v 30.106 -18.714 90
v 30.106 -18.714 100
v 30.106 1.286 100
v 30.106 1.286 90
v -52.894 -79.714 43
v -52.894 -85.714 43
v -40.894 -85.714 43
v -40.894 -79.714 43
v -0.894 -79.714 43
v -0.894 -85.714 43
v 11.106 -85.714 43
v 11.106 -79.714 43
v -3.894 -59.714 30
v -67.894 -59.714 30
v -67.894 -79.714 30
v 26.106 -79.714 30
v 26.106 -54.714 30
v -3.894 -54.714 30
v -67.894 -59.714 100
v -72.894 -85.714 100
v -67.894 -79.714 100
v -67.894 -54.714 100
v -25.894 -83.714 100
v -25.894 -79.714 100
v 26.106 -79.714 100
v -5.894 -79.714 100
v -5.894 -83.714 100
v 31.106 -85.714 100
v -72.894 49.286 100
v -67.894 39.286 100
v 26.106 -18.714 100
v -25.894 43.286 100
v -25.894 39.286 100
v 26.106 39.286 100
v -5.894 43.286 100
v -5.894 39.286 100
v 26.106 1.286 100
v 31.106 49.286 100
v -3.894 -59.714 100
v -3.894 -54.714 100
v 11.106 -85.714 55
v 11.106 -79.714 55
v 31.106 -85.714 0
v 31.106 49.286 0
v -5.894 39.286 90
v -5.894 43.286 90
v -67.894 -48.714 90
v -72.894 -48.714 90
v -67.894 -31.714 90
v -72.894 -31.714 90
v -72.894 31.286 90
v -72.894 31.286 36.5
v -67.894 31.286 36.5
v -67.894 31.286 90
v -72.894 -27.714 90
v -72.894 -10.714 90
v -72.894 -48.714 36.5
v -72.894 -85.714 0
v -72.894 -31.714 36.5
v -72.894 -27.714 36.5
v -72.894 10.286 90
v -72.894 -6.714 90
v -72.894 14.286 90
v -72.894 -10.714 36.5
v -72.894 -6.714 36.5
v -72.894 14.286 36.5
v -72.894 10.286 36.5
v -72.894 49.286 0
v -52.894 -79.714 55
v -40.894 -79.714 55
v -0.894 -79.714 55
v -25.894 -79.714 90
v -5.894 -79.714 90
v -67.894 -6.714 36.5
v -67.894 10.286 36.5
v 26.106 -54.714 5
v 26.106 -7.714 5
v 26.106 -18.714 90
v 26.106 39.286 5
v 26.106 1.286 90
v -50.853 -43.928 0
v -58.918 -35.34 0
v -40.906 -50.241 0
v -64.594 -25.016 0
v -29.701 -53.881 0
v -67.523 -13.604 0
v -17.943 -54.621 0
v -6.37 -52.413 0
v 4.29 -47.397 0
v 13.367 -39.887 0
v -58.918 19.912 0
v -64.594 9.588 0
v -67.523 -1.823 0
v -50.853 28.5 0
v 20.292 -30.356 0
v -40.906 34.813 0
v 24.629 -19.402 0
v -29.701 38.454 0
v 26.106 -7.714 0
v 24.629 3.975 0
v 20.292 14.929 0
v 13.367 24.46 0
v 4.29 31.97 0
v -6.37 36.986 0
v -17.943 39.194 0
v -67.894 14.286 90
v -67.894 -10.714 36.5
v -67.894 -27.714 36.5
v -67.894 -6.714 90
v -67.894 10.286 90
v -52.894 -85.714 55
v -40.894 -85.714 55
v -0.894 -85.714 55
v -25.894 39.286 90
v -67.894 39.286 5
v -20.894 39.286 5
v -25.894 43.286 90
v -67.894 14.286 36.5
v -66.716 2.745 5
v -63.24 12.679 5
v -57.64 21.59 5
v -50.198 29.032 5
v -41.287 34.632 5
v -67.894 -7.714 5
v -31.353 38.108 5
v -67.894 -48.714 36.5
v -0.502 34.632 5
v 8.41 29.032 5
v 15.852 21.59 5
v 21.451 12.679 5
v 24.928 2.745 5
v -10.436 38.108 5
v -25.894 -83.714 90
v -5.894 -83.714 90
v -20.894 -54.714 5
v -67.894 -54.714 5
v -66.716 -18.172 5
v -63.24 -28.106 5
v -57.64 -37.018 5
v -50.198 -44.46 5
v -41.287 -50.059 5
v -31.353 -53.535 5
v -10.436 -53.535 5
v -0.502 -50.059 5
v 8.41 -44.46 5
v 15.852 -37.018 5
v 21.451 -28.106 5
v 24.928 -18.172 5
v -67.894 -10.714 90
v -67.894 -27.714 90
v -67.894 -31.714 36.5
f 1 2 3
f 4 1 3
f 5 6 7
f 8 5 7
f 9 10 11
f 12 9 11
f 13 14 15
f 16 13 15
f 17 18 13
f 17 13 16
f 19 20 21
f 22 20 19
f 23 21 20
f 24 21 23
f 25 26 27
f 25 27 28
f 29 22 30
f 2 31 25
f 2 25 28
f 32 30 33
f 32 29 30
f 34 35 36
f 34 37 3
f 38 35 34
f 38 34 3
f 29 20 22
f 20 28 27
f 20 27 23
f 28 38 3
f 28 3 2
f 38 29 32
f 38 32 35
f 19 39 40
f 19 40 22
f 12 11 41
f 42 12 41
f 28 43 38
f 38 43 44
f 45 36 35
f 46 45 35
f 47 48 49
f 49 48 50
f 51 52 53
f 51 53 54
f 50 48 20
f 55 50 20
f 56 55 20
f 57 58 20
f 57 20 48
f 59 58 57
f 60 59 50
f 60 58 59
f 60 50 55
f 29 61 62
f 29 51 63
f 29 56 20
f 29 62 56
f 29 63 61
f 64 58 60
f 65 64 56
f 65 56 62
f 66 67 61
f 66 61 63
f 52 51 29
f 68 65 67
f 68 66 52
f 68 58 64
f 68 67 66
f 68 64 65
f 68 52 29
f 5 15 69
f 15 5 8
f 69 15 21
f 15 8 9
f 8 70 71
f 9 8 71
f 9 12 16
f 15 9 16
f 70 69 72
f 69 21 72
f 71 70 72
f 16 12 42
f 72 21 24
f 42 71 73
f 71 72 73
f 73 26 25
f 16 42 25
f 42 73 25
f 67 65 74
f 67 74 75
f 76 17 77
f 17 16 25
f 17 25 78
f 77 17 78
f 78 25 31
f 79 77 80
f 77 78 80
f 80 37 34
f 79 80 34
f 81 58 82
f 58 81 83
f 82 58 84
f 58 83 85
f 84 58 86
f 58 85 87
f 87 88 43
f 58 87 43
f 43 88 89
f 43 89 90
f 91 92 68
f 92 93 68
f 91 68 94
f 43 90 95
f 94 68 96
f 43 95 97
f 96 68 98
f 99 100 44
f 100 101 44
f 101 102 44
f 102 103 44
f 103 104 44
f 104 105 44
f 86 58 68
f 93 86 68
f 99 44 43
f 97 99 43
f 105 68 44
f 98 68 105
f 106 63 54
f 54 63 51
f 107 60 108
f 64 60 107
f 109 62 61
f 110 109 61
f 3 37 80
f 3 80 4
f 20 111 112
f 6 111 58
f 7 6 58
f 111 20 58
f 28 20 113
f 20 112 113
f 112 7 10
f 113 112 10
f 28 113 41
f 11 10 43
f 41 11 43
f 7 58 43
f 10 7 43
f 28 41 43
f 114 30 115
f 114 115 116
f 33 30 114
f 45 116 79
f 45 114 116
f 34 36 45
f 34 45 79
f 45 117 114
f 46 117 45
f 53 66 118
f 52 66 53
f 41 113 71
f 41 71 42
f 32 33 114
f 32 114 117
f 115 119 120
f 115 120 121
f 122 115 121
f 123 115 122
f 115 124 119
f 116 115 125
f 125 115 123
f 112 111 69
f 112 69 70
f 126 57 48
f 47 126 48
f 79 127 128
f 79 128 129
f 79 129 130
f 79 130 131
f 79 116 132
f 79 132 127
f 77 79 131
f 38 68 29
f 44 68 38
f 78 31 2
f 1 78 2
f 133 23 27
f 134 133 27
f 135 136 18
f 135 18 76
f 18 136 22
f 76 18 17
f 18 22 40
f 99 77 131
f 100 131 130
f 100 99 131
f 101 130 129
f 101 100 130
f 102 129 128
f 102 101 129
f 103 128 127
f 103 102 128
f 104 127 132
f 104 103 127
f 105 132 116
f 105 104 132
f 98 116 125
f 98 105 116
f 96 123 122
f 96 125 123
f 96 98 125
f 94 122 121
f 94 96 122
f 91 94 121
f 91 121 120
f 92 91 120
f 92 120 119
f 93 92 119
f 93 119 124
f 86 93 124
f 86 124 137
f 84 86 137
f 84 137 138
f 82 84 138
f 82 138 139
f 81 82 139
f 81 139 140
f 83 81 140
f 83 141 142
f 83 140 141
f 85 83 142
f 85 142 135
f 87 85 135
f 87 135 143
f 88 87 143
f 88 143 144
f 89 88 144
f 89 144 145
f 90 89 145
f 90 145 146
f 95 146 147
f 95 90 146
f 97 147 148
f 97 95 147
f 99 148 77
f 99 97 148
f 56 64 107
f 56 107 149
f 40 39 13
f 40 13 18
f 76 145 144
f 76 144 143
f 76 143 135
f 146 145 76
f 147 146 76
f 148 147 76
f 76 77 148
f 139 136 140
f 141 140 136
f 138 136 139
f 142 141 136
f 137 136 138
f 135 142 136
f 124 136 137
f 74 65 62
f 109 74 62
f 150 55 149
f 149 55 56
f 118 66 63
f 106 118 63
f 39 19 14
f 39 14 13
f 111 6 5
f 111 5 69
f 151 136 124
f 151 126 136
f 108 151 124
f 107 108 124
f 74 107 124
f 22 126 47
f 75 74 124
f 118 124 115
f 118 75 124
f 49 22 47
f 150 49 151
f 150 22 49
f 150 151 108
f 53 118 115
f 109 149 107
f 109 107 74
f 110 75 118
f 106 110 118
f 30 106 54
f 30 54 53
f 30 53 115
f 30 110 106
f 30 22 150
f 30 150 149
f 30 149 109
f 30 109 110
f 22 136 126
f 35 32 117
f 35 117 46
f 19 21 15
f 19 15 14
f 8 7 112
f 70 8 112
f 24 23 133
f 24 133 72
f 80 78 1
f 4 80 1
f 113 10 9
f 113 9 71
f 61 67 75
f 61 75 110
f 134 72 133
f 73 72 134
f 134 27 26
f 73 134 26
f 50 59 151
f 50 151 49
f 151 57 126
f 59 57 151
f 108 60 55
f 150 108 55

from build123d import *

# Parameters (mm, degrees)
SKETCH_1_W          = 104
SKETCH_1_H          = 135
SKETCH_1_R          = 47
EXTRUDE_2_DEPTH     = 100
SKETCH_2_W          = 94
SKETCH_2_H          = 94
CUT_EXTRUDE_1_DEPTH = 95
SKETCH_3_W          = 30
SKETCH_3_H          = 5
SKETCH_3_W_2        = 94
SKETCH_3_H_2        = 20
CUT_EXTRUDE_3_DEPTH = 70
SKETCH_4_W          = 20
SKETCH_4_H          = 4
SKETCH_4_W_2        = 4
SKETCH_4_H_2        = 20
CUT_EXTRUDE_4_DEPTH = 10
CUT_EXTRUDE_6_REACH = 106
SKETCH_6_W          = 53.5
SKETCH_6_H          = 17
CUT_EXTRUDE_7_REACH = 137
SKETCH_7_W          = 12
SKETCH_7_H          = 12


with BuildPart() as part:
    # 草圖1 → 填料-伸長2 (new body)
    with BuildSketch(Plane.XY):
        with Locations((-20.894077044, -18.213740458)):
            Rectangle(SKETCH_1_W, SKETCH_1_H)
        with Locations((-20.894077044, -7.713740458)):
            Circle(SKETCH_1_R, mode=Mode.SUBTRACT)
    extrude(amount=EXTRUDE_2_DEPTH)

    # 草圖2 → 除料-伸長1 (cut)
    with BuildSketch(Plane.XY.offset(100)):
        with Locations((-20.894077044, -7.713740458)):
            Rectangle(SKETCH_2_W, SKETCH_2_H)
    extrude(amount=-CUT_EXTRUDE_1_DEPTH, mode=Mode.SUBTRACT)

    # 草圖3 → 除料-伸長3 (cut)
    with BuildSketch(Plane.XY.offset(100)):
        with Locations((11.105922956, -57.213740458)):
            Rectangle(SKETCH_3_W, SKETCH_3_H)
        with Locations((-20.894077044, -69.713740458)):
            Rectangle(SKETCH_3_W_2, SKETCH_3_H_2)
    extrude(amount=-CUT_EXTRUDE_3_DEPTH, mode=Mode.SUBTRACT)

    # 草圖4 → 除料-伸長4 (cut)
    with BuildSketch(Plane.XY.offset(100)):
        with Locations((-15.894077044, -81.713740458)):
            Rectangle(SKETCH_4_W, SKETCH_4_H)
        with Locations((28.105922956, -8.713740458)):
            Rectangle(SKETCH_4_W_2, SKETCH_4_H_2)
        with Locations((-15.894077044, 41.286259542)):
            Rectangle(SKETCH_4_W, SKETCH_4_H)
    extrude(amount=-CUT_EXTRUDE_4_DEPTH, mode=Mode.SUBTRACT)

    # 草圖6 → 除料-伸長6 (cut, up to next)
    with BuildSketch(Plane.ZY.offset(72.894077044), mode=Mode.PRIVATE) as cut_extrude_6_sk1:
        with Locations((63.25, 22.786259542)):
            Rectangle(SKETCH_6_W, SKETCH_6_H)
    cut_extrude_6_tool1 = extrude(cut_extrude_6_sk1.sketch, amount=-CUT_EXTRUDE_6_REACH, mode=Mode.PRIVATE) & part.part
    add(cut_extrude_6_tool1.solids().sort_by_distance((-72.894077, 22.78626, 63.25))[0], mode=Mode.SUBTRACT)
    # 草圖6 → 除料-伸長6 (cut, up to next)
    with BuildSketch(Plane.ZY.offset(72.894077044), mode=Mode.PRIVATE) as cut_extrude_6_sk2:
        with Locations((63.25, 1.786259542)):
            Rectangle(SKETCH_6_W, SKETCH_6_H)
    cut_extrude_6_tool2 = extrude(cut_extrude_6_sk2.sketch, amount=-CUT_EXTRUDE_6_REACH, mode=Mode.PRIVATE) & part.part
    add(cut_extrude_6_tool2.solids().sort_by_distance((-72.894077, 1.78626, 63.25))[0], mode=Mode.SUBTRACT)
    # 草圖6 → 除料-伸長6 (cut, up to next)
    with BuildSketch(Plane.ZY.offset(72.894077044), mode=Mode.PRIVATE) as cut_extrude_6_sk3:
        with Locations((63.25, -19.213740458)):
            Rectangle(SKETCH_6_W, SKETCH_6_H)
    cut_extrude_6_tool3 = extrude(cut_extrude_6_sk3.sketch, amount=-CUT_EXTRUDE_6_REACH, mode=Mode.PRIVATE) & part.part
    add(cut_extrude_6_tool3.solids().sort_by_distance((-72.894077, -19.21374, 63.25))[0], mode=Mode.SUBTRACT)
    # 草圖6 → 除料-伸長6 (cut, up to next)
    with BuildSketch(Plane.ZY.offset(72.894077044), mode=Mode.PRIVATE) as cut_extrude_6_sk4:
        with Locations((63.25, -40.213740458)):
            Rectangle(SKETCH_6_W, SKETCH_6_H)
    cut_extrude_6_tool4 = extrude(cut_extrude_6_sk4.sketch, amount=-CUT_EXTRUDE_6_REACH, mode=Mode.PRIVATE) & part.part
    add(cut_extrude_6_tool4.solids().sort_by_distance((-72.894077, -40.21374, 63.25))[0], mode=Mode.SUBTRACT)

    # 草圖7 → 除料-伸長7 (cut, up to next)
    with BuildSketch(Plane.XZ.offset(85.713740458), mode=Mode.PRIVATE) as cut_extrude_7_sk1:
        with Locations((5.105922956, 49)):
            Rectangle(SKETCH_7_W, SKETCH_7_H)
    cut_extrude_7_tool1 = extrude(cut_extrude_7_sk1.sketch, amount=-CUT_EXTRUDE_7_REACH, mode=Mode.PRIVATE) & part.part
    add(cut_extrude_7_tool1.solids().sort_by_distance((5.105923, -85.71374, 49))[0], mode=Mode.SUBTRACT)
    # 草圖7 → 除料-伸長7 (cut, up to next)
    with BuildSketch(Plane.XZ.offset(85.713740458), mode=Mode.PRIVATE) as cut_extrude_7_sk2:
        with Locations((-46.894077044, 49)):
            Rectangle(SKETCH_7_W, SKETCH_7_H)
    cut_extrude_7_tool2 = extrude(cut_extrude_7_sk2.sketch, amount=-CUT_EXTRUDE_7_REACH, mode=Mode.PRIVATE) & part.part
    add(cut_extrude_7_tool2.solids().sort_by_distance((-46.894077, -85.71374, 49))[0], mode=Mode.SUBTRACT)


solid = part.part
